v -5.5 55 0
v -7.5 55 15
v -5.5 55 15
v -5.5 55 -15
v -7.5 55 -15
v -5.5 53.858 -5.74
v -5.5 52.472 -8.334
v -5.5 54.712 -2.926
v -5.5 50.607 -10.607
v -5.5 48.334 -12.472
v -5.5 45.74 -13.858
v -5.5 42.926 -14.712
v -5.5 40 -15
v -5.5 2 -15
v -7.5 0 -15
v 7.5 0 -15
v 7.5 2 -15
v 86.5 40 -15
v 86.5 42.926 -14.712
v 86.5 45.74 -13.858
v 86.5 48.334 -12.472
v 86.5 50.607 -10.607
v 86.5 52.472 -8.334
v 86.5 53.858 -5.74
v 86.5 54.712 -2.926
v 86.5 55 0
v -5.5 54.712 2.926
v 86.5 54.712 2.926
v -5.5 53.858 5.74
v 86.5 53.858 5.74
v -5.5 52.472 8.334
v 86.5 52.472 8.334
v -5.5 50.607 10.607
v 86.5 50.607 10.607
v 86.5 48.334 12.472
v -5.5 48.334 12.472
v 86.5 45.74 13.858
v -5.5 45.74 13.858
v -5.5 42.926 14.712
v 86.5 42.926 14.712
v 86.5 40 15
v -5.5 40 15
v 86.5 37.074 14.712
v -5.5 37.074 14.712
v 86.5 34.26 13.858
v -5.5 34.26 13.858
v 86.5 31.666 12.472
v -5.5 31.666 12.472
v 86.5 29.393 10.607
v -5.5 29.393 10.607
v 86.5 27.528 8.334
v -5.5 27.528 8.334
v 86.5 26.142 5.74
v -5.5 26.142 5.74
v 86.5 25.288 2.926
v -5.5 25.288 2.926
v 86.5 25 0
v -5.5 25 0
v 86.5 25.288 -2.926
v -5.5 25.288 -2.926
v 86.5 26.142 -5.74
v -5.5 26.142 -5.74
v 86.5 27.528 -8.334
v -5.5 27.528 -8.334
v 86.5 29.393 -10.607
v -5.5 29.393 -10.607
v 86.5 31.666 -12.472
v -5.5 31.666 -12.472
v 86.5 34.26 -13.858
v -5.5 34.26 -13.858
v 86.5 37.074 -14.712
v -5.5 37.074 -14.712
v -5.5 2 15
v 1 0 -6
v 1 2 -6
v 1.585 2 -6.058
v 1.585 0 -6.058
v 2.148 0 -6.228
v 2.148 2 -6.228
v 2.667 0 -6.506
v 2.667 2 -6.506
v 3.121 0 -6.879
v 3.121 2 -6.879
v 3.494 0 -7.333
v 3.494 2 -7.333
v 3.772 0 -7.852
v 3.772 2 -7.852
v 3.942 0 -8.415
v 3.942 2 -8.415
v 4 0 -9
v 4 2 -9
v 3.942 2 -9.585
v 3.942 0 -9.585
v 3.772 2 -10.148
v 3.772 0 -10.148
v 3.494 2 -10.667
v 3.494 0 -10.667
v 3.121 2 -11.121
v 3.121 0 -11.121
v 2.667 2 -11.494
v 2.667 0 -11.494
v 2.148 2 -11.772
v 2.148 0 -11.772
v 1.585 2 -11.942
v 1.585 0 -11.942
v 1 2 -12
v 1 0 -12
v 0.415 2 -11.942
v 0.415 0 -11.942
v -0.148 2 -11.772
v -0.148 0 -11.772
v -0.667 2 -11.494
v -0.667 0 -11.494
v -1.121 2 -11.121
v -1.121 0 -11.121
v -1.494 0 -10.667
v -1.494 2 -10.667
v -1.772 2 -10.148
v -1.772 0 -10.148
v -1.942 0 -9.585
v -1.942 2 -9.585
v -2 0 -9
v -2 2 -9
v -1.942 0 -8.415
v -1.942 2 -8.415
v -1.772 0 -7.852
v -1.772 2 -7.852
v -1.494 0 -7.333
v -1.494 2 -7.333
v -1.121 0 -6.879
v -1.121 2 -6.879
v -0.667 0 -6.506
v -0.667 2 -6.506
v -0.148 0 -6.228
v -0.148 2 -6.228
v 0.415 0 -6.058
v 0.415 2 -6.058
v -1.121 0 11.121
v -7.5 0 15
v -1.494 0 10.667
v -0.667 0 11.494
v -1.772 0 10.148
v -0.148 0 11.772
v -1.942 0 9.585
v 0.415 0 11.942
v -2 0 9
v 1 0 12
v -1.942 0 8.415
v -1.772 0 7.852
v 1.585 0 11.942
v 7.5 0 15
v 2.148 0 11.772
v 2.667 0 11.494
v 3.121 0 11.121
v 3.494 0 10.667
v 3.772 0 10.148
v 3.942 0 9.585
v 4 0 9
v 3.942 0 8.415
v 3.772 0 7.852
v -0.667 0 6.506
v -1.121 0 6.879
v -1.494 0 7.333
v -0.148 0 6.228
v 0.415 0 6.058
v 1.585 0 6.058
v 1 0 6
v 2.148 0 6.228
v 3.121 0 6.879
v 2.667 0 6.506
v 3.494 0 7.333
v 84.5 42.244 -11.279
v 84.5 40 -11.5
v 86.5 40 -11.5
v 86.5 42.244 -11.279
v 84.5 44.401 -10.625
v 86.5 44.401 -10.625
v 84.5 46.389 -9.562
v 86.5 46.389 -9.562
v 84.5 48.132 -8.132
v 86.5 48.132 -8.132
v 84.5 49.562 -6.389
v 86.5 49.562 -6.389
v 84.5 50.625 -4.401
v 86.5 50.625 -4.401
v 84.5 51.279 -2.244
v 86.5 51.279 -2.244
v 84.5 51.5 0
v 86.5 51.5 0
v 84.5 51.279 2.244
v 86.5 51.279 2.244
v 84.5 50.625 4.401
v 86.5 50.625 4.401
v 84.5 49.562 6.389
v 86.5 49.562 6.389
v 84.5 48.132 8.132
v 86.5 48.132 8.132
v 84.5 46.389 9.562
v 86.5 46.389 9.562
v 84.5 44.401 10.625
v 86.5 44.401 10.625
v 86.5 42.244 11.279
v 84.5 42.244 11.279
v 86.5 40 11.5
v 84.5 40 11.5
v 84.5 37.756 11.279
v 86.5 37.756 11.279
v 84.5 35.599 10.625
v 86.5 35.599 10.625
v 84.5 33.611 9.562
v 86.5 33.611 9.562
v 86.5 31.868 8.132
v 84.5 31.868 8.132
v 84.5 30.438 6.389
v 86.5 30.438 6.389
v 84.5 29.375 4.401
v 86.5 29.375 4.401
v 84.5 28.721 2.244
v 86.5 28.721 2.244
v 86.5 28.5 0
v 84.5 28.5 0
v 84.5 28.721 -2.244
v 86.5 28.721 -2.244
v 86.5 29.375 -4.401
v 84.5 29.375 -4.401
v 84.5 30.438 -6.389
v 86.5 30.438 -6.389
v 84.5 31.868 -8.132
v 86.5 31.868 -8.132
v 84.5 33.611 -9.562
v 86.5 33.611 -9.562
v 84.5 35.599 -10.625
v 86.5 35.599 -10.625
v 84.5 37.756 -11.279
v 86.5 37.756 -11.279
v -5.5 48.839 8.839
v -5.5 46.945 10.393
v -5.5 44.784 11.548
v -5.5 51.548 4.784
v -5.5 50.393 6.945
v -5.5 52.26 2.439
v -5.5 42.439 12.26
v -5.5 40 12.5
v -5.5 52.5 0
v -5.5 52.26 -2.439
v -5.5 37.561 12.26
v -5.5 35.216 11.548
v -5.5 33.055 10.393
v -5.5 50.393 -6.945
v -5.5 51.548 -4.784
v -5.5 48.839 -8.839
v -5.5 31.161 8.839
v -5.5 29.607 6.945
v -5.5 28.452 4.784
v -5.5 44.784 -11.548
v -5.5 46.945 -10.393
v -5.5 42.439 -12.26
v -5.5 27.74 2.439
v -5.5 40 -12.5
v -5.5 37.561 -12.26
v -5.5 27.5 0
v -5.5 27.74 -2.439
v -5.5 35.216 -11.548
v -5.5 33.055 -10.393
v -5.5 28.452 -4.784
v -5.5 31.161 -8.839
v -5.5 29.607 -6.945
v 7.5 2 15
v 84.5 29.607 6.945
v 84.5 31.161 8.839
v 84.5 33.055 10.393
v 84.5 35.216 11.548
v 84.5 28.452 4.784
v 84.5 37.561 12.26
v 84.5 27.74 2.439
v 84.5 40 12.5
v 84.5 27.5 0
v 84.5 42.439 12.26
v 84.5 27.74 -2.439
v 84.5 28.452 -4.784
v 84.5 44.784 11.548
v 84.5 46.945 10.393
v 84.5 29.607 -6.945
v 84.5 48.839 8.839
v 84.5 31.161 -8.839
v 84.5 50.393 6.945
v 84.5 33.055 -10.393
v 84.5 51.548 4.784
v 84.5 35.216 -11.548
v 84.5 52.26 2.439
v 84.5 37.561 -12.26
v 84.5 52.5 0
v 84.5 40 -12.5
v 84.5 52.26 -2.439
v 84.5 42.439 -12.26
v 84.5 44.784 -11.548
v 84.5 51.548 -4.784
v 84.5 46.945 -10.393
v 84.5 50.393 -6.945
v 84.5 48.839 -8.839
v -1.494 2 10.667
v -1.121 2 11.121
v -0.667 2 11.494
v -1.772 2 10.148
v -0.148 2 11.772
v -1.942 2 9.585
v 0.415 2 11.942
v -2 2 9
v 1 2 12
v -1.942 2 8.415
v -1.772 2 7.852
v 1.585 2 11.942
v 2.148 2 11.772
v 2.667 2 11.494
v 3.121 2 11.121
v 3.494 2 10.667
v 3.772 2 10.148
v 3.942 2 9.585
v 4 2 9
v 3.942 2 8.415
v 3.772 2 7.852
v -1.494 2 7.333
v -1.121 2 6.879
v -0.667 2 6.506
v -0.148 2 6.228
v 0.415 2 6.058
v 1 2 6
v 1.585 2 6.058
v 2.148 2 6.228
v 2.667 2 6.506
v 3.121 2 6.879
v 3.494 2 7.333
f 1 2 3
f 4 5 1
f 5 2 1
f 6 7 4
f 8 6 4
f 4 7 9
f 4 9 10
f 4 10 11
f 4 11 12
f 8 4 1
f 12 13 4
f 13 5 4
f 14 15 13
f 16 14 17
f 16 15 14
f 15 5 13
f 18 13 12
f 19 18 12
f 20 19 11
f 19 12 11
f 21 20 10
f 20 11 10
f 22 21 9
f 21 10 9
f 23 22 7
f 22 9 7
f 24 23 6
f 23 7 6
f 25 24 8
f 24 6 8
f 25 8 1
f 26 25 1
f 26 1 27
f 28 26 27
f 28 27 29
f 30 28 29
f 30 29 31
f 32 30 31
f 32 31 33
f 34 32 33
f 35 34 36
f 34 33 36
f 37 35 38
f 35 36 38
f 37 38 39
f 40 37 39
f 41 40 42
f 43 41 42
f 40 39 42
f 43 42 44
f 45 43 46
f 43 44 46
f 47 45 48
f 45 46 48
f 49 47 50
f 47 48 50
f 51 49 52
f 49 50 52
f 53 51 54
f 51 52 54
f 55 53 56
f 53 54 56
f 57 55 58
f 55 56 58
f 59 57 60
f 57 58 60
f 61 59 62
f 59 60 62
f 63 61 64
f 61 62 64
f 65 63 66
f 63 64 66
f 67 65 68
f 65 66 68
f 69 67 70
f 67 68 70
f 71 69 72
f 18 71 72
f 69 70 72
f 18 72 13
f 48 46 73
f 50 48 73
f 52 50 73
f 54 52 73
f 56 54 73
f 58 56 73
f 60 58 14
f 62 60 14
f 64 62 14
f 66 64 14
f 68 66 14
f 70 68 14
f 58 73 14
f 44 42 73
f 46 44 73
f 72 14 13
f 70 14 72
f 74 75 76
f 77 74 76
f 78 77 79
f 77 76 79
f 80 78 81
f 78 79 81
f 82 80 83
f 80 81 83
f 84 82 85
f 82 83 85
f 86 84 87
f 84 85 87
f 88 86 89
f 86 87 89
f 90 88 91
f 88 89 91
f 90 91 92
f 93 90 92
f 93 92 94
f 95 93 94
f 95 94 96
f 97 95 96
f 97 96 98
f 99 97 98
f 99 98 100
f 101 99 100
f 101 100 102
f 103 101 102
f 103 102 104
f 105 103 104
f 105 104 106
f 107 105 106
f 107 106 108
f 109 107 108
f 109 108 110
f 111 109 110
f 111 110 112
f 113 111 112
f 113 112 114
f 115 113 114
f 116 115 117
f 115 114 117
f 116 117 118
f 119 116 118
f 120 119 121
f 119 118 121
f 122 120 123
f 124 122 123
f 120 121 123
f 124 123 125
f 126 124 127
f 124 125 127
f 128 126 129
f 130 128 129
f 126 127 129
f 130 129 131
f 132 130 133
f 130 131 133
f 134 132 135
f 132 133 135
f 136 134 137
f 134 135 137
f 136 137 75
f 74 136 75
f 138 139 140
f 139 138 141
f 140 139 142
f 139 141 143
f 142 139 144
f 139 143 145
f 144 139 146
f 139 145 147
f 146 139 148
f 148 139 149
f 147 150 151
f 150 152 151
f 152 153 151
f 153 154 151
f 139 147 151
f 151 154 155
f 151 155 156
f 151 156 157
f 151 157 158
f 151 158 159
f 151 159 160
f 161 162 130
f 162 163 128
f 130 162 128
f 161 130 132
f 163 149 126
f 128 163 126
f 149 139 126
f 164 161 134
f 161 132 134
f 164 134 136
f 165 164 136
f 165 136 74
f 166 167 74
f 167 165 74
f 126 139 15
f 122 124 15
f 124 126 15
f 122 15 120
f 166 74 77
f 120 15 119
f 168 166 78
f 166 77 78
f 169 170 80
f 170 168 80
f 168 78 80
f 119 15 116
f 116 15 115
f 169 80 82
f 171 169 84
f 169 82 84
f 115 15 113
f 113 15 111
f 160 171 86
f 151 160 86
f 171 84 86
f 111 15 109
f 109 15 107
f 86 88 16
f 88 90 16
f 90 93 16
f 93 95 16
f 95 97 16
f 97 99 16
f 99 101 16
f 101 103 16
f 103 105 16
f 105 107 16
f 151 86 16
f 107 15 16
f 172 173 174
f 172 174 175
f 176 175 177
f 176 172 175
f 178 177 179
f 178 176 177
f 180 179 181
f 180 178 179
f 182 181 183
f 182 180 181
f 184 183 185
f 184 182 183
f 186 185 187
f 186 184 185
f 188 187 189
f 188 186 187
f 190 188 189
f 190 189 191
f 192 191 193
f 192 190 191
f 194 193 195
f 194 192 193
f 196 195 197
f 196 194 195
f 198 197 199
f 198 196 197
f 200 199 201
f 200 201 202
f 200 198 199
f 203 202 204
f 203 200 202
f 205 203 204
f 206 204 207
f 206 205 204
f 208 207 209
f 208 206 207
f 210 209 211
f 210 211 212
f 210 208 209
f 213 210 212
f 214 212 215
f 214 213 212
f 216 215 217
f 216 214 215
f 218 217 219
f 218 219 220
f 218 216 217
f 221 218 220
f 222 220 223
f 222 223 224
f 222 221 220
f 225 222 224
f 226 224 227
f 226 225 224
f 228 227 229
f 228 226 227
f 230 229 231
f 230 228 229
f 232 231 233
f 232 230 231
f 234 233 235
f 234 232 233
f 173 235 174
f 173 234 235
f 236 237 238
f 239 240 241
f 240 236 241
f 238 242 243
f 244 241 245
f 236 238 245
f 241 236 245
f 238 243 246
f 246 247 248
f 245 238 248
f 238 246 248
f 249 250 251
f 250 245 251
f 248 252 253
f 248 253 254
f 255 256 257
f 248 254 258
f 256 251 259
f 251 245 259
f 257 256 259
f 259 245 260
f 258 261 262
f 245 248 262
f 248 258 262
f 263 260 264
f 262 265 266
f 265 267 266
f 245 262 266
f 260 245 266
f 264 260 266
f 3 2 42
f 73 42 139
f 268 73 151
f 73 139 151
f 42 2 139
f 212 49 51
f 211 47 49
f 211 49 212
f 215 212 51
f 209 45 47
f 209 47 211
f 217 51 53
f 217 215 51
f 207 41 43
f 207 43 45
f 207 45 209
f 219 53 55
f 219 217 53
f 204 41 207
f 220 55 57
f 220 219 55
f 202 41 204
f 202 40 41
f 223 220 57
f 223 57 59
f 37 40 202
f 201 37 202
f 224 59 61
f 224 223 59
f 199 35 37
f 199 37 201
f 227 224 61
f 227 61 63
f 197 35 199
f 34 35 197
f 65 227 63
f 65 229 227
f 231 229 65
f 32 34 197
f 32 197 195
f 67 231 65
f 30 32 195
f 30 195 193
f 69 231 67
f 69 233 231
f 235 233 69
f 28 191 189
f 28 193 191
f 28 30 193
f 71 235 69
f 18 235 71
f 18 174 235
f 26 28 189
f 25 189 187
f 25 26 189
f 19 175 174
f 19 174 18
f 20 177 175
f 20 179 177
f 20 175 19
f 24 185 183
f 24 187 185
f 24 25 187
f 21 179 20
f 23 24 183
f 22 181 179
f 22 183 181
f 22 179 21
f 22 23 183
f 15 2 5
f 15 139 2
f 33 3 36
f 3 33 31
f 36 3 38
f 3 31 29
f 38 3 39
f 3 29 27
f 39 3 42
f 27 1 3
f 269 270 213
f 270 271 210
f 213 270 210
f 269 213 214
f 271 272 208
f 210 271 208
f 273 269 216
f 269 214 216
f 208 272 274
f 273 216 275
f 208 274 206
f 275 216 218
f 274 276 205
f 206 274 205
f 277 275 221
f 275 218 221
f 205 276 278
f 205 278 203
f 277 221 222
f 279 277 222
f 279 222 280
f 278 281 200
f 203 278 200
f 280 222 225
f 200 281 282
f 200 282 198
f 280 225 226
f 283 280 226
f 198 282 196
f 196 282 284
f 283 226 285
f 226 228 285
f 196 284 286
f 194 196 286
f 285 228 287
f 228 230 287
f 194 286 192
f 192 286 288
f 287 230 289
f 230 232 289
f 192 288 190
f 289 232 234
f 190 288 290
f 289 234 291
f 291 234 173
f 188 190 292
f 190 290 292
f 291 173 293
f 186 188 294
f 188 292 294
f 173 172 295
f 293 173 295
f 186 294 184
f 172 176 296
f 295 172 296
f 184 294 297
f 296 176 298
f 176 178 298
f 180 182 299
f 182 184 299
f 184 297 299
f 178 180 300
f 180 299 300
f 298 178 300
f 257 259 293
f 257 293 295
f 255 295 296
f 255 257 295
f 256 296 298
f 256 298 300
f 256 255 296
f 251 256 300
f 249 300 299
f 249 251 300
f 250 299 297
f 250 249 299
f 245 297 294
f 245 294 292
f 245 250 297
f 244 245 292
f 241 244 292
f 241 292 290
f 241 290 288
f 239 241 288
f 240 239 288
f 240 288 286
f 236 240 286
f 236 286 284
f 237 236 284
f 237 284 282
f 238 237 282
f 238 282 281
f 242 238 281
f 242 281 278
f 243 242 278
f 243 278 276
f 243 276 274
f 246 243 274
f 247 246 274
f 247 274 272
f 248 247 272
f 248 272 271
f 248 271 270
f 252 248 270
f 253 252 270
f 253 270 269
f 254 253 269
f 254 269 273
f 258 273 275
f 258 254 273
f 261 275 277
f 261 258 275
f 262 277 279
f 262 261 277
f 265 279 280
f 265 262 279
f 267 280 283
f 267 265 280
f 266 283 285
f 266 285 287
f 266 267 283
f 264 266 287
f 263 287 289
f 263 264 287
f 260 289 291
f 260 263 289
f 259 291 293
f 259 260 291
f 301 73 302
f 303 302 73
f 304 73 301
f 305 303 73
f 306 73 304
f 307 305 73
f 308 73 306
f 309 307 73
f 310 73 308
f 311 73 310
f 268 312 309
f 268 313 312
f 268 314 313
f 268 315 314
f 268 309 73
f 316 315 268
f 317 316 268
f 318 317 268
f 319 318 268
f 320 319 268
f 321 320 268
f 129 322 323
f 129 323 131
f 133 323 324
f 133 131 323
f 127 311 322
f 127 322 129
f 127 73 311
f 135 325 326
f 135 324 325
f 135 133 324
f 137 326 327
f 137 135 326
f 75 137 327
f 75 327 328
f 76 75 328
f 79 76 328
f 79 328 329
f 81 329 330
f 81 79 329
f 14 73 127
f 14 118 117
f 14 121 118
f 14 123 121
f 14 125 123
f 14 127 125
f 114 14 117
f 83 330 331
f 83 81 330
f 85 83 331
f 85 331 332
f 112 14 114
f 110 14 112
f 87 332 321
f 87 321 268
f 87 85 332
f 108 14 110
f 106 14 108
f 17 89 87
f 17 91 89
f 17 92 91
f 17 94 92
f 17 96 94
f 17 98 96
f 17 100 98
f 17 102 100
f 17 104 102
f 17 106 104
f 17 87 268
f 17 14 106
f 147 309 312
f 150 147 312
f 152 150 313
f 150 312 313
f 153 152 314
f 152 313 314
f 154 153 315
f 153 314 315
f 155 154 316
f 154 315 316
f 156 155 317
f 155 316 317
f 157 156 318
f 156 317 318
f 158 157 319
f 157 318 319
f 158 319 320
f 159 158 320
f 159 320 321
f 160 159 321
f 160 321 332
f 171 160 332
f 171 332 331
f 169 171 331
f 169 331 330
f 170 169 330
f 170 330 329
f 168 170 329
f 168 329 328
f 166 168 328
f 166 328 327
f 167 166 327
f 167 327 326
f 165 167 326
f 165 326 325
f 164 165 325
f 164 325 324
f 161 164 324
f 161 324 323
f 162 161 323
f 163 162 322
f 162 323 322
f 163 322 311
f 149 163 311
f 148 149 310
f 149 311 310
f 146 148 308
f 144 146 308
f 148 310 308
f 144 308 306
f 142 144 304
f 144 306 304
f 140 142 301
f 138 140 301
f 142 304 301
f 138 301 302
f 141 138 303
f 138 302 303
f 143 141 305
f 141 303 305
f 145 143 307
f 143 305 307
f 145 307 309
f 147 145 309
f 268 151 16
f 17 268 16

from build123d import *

# Parameters (mm, degrees)
SKETCH1_W           = 15
SKETCH1_H           = 30
BOSS_EXTRUDE1_DEPTH = 2
SKETCH2_W           = 2
SKETCH2_H           = 30
BOSS_EXTRUDE2_DEPTH = 53
SKETCH3_R           = 15
SKETCH3_R_2         = 12.5
BOSS_EXTRUDE3_DEPTH = 92
BOSS_EXTRUDE4_START = -2
SKETCH4_R           = 12.5
SKETCH4_R_2         = 11.5
BOSS_EXTRUDE4_DEPTH = 2
SKETCH7_R           = 3
CUT_EXTRUDE1_DEPTH  = 10


with BuildPart() as part:
    # Sketch1 → Boss-Extrude1 (new body)
    with BuildSketch(Plane(origin=(0, 0, 0), x_dir=(1, 0, 0), z_dir=(0, 1, 0))):
        Rectangle(SKETCH1_W, SKETCH1_H)
    extrude(amount=BOSS_EXTRUDE1_DEPTH)

    # Sketch2 → Boss-Extrude2 (add)
    with BuildSketch(Plane(origin=(0, 2, 0), x_dir=(1, 0, 0), z_dir=(0, 1, 0))):
        with Locations((-6.5, 0)):
            Rectangle(SKETCH2_W, SKETCH2_H)
    extrude(amount=BOSS_EXTRUDE2_DEPTH)

    # Sketch3 → Boss-Extrude3 (add)
    with BuildSketch(Plane(origin=(-5.5, 0, 0), x_dir=(0, 0, -1), z_dir=(1, 0, 0))):
        with Locations((0, 40)):
            Circle(SKETCH3_R)
        with Locations((0, 40)):
            Circle(SKETCH3_R_2, mode=Mode.SUBTRACT)
    extrude(amount=BOSS_EXTRUDE3_DEPTH)

    # Sketch4 → Boss-Extrude4 (add)
    with BuildSketch(Plane(origin=(86.5, 0, 0), x_dir=(0, 0, -1), z_dir=(1, 0, 0)).offset(BOSS_EXTRUDE4_START)):
        with Locations((0, 40)):
            Circle(SKETCH4_R)
        with Locations((0, 40)):
            Circle(SKETCH4_R_2, mode=Mode.SUBTRACT)
    extrude(amount=BOSS_EXTRUDE4_DEPTH)

    # Sketch7 → Cut-Extrude1 (cut)
    with BuildSketch(Plane(origin=(0, 2, 0), x_dir=(1, 0, 0), z_dir=(0, 1, 0))):
        with Locations(Location((1, -9, 0), (0, 0, 270))):
            Circle(SKETCH7_R)
        with Locations(Location((1, 9, 0), (0, 0, 270))):
            Circle(SKETCH7_R)
    extrude(amount=-CUT_EXTRUDE1_DEPTH, mode=Mode.SUBTRACT)


solid = part.part
